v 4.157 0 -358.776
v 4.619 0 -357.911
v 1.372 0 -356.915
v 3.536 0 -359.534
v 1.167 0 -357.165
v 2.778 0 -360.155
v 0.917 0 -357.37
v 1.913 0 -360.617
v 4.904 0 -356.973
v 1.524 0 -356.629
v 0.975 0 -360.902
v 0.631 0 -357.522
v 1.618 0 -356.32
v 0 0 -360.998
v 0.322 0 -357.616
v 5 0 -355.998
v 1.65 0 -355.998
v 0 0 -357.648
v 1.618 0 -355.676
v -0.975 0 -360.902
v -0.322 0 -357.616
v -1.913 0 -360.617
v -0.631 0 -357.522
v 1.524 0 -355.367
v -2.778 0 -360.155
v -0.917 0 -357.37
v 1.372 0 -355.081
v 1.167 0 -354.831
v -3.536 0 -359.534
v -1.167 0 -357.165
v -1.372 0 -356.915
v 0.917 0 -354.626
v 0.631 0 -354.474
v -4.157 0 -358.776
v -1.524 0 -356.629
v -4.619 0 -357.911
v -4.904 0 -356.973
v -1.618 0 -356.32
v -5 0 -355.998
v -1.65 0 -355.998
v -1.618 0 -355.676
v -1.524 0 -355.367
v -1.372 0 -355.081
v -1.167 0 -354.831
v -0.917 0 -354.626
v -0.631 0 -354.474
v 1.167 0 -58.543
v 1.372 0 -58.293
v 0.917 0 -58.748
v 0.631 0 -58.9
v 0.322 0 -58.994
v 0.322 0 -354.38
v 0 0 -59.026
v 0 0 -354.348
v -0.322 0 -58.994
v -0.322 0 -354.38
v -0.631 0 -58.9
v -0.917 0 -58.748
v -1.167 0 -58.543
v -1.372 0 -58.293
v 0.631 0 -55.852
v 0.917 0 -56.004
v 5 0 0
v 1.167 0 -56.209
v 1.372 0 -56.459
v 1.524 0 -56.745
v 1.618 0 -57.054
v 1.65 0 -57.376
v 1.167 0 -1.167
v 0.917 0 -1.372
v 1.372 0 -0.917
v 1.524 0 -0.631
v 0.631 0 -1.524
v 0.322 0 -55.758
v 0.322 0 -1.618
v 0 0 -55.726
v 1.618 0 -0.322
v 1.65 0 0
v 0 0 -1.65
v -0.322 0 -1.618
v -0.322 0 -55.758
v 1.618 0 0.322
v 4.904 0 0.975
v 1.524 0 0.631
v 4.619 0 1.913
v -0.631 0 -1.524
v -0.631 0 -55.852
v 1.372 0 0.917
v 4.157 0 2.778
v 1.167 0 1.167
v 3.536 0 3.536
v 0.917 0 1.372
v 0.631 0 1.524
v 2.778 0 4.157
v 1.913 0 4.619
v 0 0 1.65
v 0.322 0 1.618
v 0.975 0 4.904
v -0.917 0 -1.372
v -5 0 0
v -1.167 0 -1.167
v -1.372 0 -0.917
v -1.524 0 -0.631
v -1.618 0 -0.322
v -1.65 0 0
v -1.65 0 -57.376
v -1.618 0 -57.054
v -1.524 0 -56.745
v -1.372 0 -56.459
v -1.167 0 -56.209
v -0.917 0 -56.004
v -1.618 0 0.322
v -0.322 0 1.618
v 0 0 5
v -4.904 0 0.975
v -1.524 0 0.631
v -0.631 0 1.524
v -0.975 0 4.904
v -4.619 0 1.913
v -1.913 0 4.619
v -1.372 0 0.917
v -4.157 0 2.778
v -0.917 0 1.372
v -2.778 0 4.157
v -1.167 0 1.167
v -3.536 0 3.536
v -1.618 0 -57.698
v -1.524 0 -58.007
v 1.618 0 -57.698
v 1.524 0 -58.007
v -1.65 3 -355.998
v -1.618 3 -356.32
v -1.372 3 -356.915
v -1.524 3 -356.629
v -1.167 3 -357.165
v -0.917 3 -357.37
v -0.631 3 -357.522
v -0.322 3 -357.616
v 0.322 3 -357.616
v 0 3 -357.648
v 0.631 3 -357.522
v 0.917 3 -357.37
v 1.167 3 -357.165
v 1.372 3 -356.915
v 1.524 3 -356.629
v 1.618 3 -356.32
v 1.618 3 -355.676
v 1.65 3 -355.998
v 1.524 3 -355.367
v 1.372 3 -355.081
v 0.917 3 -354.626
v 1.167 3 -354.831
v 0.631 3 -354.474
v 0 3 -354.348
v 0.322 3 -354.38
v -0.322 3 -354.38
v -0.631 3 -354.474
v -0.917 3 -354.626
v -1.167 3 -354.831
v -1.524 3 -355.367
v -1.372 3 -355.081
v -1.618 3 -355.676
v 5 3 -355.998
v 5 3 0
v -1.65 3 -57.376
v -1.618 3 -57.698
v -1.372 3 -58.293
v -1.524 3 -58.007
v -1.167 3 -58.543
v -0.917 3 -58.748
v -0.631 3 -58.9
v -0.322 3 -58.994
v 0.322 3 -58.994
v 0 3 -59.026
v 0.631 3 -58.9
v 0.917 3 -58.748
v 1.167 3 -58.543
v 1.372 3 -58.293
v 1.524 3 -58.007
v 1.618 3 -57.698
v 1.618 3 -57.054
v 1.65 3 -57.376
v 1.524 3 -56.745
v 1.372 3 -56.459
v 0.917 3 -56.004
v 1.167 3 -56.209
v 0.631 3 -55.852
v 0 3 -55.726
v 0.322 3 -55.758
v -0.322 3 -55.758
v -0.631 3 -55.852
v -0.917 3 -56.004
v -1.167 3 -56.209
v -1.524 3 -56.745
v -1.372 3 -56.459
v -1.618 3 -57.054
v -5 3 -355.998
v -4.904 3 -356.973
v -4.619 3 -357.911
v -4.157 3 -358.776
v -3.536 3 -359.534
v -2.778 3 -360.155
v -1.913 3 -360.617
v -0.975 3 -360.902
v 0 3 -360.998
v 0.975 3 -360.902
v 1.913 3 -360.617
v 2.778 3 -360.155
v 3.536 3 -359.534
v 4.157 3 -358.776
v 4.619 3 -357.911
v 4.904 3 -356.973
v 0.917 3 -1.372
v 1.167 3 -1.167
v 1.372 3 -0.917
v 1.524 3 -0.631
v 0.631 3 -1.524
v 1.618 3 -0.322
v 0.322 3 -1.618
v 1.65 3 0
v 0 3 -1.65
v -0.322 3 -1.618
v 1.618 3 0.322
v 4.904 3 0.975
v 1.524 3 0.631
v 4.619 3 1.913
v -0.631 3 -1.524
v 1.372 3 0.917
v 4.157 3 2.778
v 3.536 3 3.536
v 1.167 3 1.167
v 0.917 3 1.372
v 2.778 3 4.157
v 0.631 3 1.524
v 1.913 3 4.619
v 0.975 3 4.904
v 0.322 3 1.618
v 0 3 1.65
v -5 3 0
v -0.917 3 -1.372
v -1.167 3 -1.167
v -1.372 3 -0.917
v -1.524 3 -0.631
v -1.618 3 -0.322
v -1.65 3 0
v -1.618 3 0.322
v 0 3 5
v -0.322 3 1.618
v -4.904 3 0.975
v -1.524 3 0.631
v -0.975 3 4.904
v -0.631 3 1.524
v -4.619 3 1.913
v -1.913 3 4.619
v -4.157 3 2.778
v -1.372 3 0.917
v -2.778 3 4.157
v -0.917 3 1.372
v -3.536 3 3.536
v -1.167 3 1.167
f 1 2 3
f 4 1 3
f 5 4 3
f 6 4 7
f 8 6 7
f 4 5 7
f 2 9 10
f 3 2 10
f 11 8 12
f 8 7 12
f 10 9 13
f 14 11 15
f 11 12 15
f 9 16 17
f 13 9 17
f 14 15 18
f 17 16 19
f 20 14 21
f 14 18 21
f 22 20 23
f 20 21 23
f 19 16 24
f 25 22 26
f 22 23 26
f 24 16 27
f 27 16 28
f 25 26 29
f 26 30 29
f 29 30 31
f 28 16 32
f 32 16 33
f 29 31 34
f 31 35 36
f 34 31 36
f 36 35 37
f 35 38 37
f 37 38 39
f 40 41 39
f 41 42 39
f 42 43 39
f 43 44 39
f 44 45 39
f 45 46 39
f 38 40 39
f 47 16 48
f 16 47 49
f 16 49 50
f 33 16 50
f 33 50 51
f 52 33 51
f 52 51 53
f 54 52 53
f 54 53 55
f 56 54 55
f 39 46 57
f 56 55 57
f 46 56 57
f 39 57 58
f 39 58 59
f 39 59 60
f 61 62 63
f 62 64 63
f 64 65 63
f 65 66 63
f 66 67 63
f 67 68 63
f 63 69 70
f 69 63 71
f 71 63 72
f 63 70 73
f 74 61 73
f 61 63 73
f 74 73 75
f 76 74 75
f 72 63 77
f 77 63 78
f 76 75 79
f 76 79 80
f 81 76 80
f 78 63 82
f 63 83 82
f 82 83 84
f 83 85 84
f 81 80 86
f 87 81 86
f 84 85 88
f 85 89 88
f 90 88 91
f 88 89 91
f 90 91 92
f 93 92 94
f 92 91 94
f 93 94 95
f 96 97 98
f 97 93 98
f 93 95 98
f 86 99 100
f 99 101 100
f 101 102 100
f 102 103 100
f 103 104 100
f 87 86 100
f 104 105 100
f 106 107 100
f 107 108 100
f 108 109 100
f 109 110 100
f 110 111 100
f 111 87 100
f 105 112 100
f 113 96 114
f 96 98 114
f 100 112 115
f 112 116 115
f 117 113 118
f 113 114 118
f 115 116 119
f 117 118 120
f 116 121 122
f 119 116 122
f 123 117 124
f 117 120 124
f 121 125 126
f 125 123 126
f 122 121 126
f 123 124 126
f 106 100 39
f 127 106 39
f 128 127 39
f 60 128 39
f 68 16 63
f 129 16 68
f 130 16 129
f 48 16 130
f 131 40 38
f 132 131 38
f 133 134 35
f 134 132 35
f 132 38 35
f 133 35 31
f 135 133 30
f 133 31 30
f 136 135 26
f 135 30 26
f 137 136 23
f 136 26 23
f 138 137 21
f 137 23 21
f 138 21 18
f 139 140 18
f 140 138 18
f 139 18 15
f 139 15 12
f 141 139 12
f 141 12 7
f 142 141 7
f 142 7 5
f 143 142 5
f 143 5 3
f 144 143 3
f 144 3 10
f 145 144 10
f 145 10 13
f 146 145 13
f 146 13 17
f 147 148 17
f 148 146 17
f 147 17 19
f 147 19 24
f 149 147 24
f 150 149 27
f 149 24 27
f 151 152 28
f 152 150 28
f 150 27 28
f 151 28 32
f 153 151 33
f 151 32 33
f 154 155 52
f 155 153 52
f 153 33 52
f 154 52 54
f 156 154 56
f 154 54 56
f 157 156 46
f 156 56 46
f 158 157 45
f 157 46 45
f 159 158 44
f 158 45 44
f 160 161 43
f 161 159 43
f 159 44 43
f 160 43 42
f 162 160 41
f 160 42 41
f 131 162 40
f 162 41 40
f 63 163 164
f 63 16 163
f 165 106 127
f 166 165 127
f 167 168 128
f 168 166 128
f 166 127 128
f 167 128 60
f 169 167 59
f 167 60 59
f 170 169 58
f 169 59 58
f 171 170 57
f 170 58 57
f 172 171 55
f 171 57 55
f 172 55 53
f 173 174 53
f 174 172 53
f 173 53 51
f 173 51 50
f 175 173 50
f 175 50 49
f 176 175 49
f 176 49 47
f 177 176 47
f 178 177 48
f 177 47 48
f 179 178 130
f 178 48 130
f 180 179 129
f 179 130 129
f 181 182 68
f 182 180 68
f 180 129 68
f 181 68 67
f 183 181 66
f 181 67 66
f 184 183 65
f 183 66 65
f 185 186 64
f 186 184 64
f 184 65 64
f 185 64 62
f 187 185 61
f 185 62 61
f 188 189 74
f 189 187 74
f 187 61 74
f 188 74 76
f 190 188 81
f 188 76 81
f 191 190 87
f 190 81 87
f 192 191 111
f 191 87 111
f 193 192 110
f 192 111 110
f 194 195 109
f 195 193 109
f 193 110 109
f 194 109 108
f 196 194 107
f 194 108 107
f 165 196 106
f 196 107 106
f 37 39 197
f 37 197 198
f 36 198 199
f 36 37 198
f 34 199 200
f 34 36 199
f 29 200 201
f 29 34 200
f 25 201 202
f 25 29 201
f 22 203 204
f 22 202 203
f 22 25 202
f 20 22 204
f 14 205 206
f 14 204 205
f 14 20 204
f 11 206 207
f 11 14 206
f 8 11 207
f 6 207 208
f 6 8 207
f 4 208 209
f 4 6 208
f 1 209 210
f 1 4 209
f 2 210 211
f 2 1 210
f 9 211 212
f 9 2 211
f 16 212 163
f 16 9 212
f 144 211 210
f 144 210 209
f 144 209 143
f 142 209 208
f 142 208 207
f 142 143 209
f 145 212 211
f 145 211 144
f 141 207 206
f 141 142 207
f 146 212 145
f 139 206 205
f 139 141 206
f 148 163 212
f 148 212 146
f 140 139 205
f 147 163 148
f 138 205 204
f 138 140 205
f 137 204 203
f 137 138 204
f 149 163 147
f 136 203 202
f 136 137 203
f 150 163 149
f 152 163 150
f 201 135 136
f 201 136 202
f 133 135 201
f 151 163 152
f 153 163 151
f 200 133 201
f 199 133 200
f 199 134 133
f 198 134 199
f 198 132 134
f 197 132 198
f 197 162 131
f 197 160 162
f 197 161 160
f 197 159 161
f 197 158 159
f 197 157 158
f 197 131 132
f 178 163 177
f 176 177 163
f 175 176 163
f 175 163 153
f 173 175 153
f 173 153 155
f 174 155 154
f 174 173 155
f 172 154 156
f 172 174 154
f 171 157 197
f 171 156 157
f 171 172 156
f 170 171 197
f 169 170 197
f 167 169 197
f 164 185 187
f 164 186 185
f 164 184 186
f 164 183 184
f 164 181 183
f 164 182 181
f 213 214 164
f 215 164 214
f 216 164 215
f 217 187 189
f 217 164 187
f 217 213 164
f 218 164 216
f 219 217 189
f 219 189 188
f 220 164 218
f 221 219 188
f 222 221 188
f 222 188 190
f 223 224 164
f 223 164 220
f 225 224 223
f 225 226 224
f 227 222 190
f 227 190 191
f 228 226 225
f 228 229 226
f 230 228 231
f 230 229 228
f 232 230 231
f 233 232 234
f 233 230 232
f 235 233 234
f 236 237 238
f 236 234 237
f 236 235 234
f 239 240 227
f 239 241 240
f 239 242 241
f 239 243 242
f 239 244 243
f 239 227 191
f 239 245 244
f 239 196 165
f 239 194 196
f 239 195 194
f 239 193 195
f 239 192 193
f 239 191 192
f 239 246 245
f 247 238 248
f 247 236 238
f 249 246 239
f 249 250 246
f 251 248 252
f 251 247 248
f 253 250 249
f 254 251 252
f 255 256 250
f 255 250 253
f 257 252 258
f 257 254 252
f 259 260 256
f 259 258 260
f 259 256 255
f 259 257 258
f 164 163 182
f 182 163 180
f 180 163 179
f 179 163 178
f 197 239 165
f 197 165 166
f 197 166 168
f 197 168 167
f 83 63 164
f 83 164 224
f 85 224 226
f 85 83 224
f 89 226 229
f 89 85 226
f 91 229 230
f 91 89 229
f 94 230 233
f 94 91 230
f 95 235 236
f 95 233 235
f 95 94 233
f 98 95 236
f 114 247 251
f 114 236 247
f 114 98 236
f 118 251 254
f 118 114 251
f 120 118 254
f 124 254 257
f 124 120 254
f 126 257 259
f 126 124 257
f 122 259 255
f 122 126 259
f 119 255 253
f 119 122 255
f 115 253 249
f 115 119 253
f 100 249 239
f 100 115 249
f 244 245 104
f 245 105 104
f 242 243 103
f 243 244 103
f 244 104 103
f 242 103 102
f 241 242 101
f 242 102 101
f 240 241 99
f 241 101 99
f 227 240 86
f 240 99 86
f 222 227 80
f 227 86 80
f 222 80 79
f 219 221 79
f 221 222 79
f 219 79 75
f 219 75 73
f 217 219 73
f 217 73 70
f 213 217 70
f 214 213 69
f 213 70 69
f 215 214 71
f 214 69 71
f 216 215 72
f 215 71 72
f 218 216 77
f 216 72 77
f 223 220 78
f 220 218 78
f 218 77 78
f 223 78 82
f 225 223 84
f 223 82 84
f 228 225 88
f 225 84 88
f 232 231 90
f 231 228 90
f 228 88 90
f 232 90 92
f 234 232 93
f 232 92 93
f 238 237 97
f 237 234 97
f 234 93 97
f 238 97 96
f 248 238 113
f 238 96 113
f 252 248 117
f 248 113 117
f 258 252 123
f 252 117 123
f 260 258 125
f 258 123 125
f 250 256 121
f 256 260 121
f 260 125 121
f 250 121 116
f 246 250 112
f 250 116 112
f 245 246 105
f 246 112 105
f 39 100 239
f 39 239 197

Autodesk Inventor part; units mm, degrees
ref_plane "YZ Plane" through (0, 0, 0) normal (1, 0, 0) x (0, 1, 0)
ref_plane "XZ Plane" through (0, 0, 0) normal (0, 1, 0) x (-1, 0, 0)
ref_plane "XY Plane" through (0, 0, 0) normal (0, 0, 1) x (1, 0, 0)
sketch "Sketch1" plane through (0, 0, 0) normal (0, 1, 0) x (-1, 0, 0)
  line L0 (0, 0) -> (0, -355.998) construction
  line L1 (5, 0) -> (5, -355.998)
  line L2 (-5, -355.998) -> (-5, 0)
  arc A0 (5, 0) -> (-5, 0) centre (0, 0) ccw
  arc A1 (-5, -355.998) -> (5, -355.998) centre (0, -355.998) ccw
  circle A2 centre (0, 0) radius 1.65
  circle A3 centre (0, -355.998) radius 1.65
  circle A4 centre (0, -57.376) radius 1.65
  point P0 (0, -177.999)
  dimension "d0" = 3.3
  dimension "d1" = 3.3
  dimension "d2" = 10
  dimension "d3" = 355.998
  dimension "d14" = 3.3
  dimension "d15" = 57.376
extrude "Extrusion1" add sketch "Sketch1" along normal blind 3
